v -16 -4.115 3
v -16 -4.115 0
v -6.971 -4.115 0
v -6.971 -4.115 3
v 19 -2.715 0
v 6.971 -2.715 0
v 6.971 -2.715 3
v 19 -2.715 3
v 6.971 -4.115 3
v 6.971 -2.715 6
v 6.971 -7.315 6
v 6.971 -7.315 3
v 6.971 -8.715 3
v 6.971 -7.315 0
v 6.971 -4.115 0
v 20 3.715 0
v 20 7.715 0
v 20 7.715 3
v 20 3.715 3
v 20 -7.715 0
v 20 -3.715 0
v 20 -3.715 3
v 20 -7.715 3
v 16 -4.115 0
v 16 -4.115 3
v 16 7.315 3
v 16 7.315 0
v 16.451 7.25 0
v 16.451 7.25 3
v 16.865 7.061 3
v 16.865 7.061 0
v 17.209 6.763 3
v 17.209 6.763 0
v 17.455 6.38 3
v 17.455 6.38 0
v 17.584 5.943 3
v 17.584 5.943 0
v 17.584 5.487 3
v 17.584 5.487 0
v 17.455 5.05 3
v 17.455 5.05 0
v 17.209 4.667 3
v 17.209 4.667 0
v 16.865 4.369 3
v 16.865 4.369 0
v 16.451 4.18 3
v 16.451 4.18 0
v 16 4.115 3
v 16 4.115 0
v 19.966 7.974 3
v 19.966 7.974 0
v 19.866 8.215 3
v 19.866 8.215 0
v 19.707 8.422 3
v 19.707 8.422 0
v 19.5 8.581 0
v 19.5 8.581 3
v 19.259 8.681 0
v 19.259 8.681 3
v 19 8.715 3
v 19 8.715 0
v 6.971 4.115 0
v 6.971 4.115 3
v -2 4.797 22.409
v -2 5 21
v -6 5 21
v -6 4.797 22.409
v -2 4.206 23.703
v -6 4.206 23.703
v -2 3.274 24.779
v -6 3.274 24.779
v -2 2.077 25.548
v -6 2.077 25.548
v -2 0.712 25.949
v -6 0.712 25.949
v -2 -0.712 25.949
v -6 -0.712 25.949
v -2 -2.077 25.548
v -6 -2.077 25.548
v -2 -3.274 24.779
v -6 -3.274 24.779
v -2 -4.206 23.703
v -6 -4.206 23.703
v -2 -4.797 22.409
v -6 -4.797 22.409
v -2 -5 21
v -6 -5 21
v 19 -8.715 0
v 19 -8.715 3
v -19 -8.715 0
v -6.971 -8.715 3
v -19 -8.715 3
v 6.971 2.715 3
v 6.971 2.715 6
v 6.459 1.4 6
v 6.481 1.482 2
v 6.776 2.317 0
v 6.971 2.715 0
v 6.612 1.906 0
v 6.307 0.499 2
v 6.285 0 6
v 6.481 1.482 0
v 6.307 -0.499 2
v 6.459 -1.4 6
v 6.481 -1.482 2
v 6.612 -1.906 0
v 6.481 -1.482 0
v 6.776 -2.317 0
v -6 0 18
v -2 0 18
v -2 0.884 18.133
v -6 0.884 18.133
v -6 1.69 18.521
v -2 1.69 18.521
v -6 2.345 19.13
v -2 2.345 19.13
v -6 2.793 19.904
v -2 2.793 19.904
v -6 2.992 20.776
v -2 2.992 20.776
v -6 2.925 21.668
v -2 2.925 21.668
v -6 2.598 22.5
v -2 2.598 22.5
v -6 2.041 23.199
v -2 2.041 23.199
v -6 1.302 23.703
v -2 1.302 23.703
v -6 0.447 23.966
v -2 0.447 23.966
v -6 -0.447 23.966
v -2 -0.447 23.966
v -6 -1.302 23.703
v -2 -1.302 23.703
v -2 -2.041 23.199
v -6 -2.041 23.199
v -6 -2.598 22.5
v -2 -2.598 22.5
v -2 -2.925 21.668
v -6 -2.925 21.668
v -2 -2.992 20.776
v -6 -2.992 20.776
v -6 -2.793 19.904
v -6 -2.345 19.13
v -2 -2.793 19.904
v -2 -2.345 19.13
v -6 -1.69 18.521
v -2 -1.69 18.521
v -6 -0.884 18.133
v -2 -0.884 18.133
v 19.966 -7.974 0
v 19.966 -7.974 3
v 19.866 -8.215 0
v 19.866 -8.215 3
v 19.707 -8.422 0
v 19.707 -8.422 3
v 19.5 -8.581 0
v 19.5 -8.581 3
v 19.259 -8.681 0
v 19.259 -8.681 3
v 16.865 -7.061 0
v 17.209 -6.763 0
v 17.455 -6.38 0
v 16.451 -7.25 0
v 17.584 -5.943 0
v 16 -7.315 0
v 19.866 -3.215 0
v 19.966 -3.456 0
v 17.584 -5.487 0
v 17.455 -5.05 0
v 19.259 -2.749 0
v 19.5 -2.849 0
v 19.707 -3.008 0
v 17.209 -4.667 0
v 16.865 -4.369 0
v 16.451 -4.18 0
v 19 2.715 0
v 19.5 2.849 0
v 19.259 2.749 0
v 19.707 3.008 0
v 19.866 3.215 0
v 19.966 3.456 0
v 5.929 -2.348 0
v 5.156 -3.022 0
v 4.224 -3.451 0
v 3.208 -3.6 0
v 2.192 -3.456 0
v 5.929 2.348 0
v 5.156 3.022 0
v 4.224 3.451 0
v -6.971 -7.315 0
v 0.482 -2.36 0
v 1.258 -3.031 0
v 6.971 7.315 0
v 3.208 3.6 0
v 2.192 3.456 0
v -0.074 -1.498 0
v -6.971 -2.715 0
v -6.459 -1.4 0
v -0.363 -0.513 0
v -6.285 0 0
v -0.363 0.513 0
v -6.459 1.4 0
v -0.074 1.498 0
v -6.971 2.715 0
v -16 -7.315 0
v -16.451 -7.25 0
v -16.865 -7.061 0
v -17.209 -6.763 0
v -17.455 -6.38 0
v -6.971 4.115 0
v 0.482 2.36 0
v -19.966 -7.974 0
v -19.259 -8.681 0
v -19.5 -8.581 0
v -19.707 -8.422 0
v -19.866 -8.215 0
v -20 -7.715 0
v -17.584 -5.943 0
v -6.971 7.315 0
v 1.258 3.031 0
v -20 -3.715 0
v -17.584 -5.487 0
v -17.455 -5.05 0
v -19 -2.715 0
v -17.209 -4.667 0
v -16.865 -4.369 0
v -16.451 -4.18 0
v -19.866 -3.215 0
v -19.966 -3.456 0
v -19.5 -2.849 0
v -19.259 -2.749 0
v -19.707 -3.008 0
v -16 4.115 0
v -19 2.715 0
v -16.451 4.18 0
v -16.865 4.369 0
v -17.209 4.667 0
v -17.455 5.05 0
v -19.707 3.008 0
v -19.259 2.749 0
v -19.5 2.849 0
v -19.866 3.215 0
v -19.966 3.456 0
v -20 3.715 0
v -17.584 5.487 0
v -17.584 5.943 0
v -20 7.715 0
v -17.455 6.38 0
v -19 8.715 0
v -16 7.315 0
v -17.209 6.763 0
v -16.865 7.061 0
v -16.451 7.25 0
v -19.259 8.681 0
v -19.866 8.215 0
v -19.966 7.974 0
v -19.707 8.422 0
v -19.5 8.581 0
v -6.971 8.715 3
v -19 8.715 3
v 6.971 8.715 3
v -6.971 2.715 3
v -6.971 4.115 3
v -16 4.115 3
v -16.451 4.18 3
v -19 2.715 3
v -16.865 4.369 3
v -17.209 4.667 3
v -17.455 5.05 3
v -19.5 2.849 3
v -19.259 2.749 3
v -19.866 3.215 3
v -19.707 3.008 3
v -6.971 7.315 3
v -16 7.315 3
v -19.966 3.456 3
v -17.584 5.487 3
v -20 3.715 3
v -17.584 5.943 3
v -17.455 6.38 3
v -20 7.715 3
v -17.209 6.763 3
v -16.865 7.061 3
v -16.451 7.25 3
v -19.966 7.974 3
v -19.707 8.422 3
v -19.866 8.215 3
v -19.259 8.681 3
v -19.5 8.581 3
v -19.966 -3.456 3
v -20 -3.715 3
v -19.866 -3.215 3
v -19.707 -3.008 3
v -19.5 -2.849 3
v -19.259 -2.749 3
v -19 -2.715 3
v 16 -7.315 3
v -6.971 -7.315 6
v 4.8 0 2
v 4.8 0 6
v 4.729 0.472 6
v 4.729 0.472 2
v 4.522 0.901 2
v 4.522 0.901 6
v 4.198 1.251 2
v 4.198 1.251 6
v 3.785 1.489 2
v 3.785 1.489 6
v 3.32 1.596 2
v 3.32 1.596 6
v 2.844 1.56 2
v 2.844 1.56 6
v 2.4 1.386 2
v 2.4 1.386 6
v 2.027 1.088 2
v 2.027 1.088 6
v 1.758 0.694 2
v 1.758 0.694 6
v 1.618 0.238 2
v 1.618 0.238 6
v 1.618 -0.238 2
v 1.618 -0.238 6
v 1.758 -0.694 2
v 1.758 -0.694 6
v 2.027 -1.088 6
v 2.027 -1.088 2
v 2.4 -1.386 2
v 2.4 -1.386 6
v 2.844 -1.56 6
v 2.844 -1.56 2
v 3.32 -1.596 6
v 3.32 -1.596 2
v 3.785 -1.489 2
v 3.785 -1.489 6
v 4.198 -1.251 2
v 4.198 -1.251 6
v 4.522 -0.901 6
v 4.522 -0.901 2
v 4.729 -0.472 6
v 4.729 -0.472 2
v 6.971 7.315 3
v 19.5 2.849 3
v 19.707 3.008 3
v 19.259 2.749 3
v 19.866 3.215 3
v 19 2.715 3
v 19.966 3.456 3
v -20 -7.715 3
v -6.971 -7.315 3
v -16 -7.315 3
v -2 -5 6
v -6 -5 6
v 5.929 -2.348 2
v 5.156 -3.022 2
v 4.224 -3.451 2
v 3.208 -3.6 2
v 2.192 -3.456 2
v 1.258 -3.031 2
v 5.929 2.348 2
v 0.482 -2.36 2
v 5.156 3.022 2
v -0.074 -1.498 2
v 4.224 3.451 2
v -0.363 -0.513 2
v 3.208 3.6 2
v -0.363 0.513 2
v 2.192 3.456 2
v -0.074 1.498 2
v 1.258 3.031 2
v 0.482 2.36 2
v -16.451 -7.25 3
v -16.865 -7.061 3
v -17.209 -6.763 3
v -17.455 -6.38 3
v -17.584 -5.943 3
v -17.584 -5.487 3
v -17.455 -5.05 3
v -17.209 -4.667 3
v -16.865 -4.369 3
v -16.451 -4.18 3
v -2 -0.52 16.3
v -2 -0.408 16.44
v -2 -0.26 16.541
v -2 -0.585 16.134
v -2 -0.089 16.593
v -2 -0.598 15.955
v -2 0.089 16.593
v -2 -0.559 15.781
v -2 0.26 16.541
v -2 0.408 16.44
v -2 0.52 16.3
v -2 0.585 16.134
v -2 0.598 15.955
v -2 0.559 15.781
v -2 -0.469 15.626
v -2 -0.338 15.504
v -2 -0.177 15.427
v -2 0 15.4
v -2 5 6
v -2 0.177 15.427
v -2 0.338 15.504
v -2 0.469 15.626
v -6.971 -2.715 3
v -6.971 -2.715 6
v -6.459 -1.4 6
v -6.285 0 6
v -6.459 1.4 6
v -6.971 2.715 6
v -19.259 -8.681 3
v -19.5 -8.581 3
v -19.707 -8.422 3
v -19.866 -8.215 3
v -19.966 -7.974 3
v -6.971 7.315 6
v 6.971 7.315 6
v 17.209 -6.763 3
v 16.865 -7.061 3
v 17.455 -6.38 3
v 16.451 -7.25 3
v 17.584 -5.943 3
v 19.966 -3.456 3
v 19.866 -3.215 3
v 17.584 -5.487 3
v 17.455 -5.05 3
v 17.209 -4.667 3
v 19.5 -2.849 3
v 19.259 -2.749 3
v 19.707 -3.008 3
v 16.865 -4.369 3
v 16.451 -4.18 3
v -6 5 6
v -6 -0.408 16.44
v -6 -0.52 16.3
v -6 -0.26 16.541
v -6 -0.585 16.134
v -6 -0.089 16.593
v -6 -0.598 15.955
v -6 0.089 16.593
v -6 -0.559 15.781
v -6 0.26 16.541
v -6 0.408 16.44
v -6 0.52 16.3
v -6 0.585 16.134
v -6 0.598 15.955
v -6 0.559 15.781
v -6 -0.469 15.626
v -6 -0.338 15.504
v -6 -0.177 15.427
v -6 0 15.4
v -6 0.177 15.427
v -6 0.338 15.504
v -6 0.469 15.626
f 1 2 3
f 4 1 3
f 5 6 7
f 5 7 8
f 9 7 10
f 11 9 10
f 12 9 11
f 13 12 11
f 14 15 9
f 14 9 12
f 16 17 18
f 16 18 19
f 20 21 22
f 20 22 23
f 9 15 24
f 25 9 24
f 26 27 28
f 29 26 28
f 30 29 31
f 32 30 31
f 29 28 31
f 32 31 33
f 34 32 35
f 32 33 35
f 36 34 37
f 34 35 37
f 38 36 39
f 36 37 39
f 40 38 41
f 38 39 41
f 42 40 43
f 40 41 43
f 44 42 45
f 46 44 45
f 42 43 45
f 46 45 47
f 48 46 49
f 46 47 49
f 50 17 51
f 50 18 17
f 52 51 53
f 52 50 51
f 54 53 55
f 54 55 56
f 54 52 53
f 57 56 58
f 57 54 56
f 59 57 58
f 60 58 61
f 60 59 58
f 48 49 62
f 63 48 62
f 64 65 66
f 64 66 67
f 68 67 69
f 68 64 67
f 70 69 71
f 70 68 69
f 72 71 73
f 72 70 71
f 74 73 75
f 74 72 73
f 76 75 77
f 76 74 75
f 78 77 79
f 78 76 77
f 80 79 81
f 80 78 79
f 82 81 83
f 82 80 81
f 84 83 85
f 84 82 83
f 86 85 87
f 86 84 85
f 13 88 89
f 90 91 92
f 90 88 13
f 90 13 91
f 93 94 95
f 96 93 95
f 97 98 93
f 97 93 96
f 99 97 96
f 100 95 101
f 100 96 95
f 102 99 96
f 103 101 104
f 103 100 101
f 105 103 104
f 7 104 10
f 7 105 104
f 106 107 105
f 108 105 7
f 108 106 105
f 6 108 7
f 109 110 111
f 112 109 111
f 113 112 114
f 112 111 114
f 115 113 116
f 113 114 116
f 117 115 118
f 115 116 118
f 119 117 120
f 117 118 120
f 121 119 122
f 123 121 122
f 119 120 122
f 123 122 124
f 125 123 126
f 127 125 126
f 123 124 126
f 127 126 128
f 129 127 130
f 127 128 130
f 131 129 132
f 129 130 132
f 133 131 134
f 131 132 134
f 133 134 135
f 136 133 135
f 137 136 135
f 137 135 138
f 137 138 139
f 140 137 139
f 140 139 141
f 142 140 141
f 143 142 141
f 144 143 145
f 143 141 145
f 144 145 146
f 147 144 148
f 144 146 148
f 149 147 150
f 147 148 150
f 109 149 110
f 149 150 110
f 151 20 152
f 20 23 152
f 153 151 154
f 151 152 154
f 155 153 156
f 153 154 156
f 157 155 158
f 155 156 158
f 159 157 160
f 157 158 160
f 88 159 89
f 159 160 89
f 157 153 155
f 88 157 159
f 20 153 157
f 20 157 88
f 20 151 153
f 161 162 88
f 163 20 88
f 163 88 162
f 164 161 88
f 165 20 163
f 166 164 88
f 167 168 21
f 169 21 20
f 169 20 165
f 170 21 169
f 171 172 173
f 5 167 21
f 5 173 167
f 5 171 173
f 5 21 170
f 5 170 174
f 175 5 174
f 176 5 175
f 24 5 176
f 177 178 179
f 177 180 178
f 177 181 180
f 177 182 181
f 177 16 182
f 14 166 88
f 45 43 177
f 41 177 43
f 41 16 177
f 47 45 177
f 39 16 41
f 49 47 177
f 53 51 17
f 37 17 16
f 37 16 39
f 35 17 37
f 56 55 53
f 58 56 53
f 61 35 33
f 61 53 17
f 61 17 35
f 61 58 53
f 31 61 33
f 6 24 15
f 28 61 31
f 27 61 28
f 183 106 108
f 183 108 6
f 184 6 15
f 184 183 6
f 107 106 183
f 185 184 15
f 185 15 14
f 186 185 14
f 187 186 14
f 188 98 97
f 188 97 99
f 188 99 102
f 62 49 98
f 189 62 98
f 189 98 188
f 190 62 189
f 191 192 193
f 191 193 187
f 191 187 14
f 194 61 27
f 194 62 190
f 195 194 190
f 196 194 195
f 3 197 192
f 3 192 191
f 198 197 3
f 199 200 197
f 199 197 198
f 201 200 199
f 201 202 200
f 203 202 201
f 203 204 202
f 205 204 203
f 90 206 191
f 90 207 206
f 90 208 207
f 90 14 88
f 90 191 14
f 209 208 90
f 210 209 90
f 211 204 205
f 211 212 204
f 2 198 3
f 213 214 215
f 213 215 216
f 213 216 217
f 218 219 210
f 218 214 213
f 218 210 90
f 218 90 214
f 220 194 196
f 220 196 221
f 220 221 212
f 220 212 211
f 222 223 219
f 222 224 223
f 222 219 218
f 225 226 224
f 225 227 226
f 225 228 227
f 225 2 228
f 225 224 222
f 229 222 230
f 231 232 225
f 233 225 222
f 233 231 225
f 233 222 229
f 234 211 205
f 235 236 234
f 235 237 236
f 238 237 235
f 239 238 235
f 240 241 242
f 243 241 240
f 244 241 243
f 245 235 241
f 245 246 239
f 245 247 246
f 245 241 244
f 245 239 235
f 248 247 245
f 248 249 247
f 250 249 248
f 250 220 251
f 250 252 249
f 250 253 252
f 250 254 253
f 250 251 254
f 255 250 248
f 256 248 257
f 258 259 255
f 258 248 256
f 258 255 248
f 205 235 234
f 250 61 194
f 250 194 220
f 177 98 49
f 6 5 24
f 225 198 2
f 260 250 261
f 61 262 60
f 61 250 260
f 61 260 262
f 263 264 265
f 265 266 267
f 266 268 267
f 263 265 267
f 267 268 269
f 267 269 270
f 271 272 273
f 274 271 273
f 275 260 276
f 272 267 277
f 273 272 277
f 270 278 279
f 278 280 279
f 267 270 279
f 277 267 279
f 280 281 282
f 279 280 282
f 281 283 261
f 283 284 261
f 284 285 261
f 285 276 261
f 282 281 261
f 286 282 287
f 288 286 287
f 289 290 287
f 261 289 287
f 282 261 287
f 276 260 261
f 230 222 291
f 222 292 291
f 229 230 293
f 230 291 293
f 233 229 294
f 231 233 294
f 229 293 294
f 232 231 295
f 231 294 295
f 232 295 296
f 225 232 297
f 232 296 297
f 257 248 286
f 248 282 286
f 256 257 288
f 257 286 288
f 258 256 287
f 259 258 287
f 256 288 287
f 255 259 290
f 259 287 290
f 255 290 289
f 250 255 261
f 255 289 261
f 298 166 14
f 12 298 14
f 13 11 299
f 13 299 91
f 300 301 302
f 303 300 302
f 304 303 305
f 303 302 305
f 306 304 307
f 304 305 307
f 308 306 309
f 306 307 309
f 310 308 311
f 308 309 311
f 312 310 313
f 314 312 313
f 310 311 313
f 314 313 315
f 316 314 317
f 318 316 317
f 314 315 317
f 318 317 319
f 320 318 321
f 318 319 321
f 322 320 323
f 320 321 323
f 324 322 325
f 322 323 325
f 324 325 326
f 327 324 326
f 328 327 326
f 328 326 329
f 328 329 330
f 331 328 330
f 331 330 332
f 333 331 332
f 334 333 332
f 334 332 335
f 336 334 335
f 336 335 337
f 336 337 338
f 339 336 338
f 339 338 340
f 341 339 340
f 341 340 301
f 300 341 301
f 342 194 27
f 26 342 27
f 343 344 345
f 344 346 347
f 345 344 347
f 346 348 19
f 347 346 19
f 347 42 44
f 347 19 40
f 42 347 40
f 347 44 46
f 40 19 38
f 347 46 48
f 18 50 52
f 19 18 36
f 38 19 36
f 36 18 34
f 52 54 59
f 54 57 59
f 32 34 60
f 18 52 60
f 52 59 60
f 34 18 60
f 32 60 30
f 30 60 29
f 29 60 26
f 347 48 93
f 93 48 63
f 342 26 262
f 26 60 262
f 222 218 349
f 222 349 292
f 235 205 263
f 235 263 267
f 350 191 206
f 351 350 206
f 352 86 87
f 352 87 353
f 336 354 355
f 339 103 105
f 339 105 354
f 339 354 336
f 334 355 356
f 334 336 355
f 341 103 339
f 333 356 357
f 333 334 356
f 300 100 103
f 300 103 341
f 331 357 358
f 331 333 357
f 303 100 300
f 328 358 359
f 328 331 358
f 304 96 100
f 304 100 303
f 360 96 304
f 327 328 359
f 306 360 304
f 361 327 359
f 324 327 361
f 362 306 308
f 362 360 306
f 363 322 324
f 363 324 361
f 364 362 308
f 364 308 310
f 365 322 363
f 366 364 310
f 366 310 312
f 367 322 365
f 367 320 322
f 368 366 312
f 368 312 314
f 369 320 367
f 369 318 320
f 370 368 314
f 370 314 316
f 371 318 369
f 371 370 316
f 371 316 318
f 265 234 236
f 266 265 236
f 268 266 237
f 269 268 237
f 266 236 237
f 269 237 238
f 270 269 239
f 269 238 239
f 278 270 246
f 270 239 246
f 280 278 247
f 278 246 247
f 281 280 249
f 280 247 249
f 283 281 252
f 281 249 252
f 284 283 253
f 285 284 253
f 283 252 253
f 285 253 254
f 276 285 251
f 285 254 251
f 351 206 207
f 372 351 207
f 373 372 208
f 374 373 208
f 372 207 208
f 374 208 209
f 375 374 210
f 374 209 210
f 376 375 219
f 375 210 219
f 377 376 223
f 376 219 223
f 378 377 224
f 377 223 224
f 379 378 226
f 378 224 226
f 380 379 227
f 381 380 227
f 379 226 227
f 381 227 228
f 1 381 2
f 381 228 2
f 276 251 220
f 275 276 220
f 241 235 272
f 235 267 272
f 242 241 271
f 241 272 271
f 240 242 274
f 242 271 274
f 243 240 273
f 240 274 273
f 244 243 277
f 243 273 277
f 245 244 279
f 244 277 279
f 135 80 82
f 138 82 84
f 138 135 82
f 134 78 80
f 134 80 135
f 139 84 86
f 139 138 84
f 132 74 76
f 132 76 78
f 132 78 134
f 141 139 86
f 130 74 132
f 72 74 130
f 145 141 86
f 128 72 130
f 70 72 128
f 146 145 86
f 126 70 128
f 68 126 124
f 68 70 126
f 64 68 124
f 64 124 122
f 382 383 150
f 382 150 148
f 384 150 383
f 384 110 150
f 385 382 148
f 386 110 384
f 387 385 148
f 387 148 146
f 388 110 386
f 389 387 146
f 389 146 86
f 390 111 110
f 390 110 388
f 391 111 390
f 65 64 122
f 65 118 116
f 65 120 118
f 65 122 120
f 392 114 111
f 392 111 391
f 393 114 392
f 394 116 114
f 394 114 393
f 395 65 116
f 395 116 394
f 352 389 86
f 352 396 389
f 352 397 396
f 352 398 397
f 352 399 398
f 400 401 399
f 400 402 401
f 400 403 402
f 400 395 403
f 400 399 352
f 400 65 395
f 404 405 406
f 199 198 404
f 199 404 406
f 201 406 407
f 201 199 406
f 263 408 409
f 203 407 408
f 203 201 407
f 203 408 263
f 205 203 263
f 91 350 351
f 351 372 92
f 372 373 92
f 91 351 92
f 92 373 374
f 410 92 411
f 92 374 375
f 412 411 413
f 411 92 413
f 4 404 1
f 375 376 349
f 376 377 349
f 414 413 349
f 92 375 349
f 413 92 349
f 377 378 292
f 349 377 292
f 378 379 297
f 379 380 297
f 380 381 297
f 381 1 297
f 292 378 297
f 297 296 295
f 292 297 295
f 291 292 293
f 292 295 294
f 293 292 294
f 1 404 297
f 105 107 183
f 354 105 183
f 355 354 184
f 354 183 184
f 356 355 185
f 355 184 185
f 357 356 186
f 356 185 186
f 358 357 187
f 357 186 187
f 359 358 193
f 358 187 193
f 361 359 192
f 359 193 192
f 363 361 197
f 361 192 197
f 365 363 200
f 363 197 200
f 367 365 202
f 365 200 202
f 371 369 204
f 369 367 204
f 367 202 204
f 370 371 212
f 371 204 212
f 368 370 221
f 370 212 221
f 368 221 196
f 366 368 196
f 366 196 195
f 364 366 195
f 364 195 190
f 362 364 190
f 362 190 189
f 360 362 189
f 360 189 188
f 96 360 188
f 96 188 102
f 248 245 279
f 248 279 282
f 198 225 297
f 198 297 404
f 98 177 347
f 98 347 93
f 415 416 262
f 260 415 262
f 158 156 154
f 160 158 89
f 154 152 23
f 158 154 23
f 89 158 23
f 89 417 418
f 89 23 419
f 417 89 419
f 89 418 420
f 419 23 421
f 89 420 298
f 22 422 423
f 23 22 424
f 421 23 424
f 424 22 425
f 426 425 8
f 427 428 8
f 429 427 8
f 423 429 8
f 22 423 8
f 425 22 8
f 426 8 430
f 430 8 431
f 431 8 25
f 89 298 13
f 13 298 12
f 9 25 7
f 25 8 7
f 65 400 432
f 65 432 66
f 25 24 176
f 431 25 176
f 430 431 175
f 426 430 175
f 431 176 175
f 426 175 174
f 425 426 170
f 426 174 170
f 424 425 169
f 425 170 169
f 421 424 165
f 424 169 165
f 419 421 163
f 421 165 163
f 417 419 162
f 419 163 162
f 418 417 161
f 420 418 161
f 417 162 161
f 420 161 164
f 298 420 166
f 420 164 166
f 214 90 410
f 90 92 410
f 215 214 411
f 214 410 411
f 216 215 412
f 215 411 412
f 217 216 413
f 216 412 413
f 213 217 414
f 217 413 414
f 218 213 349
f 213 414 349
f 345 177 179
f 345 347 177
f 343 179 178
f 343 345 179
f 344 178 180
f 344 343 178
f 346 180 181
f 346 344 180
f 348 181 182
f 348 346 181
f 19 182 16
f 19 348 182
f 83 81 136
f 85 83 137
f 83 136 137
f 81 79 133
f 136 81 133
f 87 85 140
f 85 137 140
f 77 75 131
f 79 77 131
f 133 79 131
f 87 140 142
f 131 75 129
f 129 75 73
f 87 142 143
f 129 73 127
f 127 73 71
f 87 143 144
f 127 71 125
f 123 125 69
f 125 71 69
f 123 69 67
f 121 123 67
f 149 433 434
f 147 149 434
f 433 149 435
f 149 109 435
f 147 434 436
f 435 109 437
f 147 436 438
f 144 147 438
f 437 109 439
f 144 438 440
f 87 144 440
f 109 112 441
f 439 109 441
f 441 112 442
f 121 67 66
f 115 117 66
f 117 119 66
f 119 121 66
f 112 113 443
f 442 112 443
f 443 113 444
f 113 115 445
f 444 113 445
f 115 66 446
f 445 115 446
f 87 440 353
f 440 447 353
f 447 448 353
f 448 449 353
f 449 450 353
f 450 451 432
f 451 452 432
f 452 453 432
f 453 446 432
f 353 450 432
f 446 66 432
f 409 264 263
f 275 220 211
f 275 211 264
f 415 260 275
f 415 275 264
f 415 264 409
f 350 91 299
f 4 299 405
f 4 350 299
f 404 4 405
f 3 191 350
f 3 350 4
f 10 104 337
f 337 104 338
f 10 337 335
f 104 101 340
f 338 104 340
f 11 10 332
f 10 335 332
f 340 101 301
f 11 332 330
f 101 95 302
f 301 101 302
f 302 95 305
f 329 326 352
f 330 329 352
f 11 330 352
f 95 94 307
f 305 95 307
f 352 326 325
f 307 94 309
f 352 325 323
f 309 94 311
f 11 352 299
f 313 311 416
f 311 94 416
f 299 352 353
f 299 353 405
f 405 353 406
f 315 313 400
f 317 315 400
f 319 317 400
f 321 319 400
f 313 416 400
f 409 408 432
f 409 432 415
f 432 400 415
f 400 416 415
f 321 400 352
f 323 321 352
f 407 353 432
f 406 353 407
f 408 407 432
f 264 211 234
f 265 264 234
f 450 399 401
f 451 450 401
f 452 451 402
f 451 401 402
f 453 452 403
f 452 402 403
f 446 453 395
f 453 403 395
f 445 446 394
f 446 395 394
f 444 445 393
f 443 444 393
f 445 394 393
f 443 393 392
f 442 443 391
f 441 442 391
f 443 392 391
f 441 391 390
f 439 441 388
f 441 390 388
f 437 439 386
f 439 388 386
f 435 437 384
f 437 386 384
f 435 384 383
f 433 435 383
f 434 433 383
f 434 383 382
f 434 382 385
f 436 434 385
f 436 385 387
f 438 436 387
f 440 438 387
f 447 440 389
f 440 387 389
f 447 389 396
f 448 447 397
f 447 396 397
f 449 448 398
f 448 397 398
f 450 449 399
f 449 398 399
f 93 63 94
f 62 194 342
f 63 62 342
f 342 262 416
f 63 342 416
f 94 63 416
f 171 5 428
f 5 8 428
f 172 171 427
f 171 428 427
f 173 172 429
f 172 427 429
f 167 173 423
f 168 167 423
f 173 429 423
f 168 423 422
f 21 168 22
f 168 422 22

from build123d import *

# Parameters (mm, degrees)
EXTRUDE_1_DEPTH     = 3
EXTRUDE_START       = -3
EXTRUDE_2_DEPTH     = 6
EXTRUDE_START_2     = -2
SKETCH_3_R          = 3
SKETCH_3_R_2        = 0.6
EXTRUDE_3_DEPTH     = 4
FILLET_2_R          = 1
EXTRUDE_4_DEPTH     = 13.942167231
SKETCH_8_R          = 1.6
CUT_EXTRUDE_1_DEPTH = 30.596473185
SKETCH_9_R          = 3.6
CUT_EXTRUDE_2_DEPTH = 2


with BuildPart() as part:
    # 草图1 → 凸台-拉伸1 (new body)
    with BuildSketch(Plane.XY):
        with BuildLine():
            Line((20, 8.715), (20, 2.715))
            Line((20, 2.715), (6.971083616, 2.715))
            ThreePointArc((6.971083616, 2.715), (6.285, 0), (6.971083616, -2.715))
            Line((6.971083616, -2.715), (20, -2.715))
            Line((20, -2.715), (20, -8.715))
            Line((20, -8.715), (-20, -8.715))
            Line((-20, -8.715), (-20, -2.715))
            Line((-20, -2.715), (-6.971083616, -2.715))
            ThreePointArc((-6.971083616, -2.715), (-6.285, 0), (-6.971083616, 2.715))
            Line((-6.971083616, 2.715), (-20, 2.715))
            Line((-20, 2.715), (-20, 8.715))
            Line((-20, 8.715), (20, 8.715))
        make_face()
        with BuildLine():
            Line((16, 4.115), (-16, 4.115))
            ThreePointArc((-16, 4.115), (-17.6, 5.715), (-16, 7.315))
            Line((-16, 7.315), (16, 7.315))
            ThreePointArc((16, 7.315), (17.6, 5.715), (16, 4.115))
        make_face(mode=Mode.SUBTRACT)
        with BuildLine():
            Line((16, -7.315), (-16, -7.315))
            ThreePointArc((-16, -7.315), (-17.6, -5.715), (-16, -4.115))
            Line((-16, -4.115), (16, -4.115))
            ThreePointArc((16, -4.115), (17.6, -5.715), (16, -7.315))
        make_face(mode=Mode.SUBTRACT)
    extrude(amount=EXTRUDE_1_DEPTH)

    # 草图2 → 凸台-拉伸2 (add)
    with BuildSketch(Plane.XY.offset(3).offset(EXTRUDE_START)):
        with BuildLine():
            Line((-6.971083616, 2.715), (-6.971083616, 4.115))
            Line((-6.971083616, 4.115), (-6.971083616, 7.315))
            Line((-6.971083616, 7.315), (6.971083616, 7.315))
            Line((6.971083616, 7.315), (6.971083616, 4.115))
            Line((6.971083616, 4.115), (6.971083616, 2.715))
            ThreePointArc((6.971083616, 2.715), (6.285, 0), (6.971083616, -2.715))
            Line((6.971083616, -2.715), (6.971083616, -4.115))
            Line((6.971083616, -4.115), (6.971083616, -7.315))
            Line((6.971083616, -7.315), (-6.971083616, -7.315))
            Line((-6.971083616, -7.315), (-6.971083616, -4.115))
            Line((-6.971083616, -4.115), (-6.971083616, -2.715))
            ThreePointArc((-6.971083616, -2.715), (-6.285, 0), (-6.971083616, 2.715))
        make_face()
    extrude(amount=EXTRUDE_2_DEPTH)

    # 草图3 → 凸台-拉伸3 (add)
    with BuildSketch(Plane(origin=(0, 0, 0), x_dir=(0, 0, -1), z_dir=(1, 0, 0)).offset(EXTRUDE_START_2)):
        with BuildLine():
            Line((-6, 5), (-21, 5))
            ThreePointArc((-21, 5), (-26, 0), (-21, -5))
            Line((-21, -5), (-6, -5))
            Line((-6, -5), (-6, 5))
        make_face()
        with Locations((-21, 0)):
            Circle(SKETCH_3_R, mode=Mode.SUBTRACT)
        with Locations((-16, 0)):
            Circle(SKETCH_3_R_2, mode=Mode.SUBTRACT)
    extrude(amount=-EXTRUDE_3_DEPTH)

    # 圆角2
    fillet_2_edges = [part.edges().sort_by_distance(p)[0] for p in [
        (-20, -8.715, 1.5),
        (-20, -2.715, 1.5),
        (-20, 2.715, 1.5),
        (-20, 8.715, 1.5),
        (20, 8.715, 1.5),
        (20, 2.715, 1.5),
        (20, -2.715, 1.5),
        (20, -8.715, 1.5),
    ]]
    fillet(fillet_2_edges, radius=FILLET_2_R)

    # 草图6 → 凸台-拉伸4 (add)
    with BuildSketch(Plane(origin=(6.971083616, 0, 0), x_dir=(0, 0, -1), z_dir=(1, 0, 0))):
        Polygon((-6, 7.315), (-3, 8.715), (-3, 7.315), align=None)
        Polygon((-3, -7.315), (-6, -7.315), (-3, -8.715), align=None)
    extrude(amount=-EXTRUDE_4_DEPTH)

    # 草图8 → 切除-拉伸1 (cut, through all)
    with BuildSketch(Plane.XY.offset(6)):
        with Locations((3.2, 0)):
            Circle(SKETCH_8_R)
    extrude(amount=-CUT_EXTRUDE_1_DEPTH, mode=Mode.SUBTRACT)

    # 草图9 → 切除-拉伸2 (cut)
    with BuildSketch(Plane(origin=(0, 0, 0), x_dir=(-1, 0, 0), z_dir=(0, 0, -1))):
        with Locations((-3.2, 0)):
            Circle(SKETCH_9_R)
    extrude(amount=-CUT_EXTRUDE_2_DEPTH, mode=Mode.SUBTRACT)


solid = part.part
